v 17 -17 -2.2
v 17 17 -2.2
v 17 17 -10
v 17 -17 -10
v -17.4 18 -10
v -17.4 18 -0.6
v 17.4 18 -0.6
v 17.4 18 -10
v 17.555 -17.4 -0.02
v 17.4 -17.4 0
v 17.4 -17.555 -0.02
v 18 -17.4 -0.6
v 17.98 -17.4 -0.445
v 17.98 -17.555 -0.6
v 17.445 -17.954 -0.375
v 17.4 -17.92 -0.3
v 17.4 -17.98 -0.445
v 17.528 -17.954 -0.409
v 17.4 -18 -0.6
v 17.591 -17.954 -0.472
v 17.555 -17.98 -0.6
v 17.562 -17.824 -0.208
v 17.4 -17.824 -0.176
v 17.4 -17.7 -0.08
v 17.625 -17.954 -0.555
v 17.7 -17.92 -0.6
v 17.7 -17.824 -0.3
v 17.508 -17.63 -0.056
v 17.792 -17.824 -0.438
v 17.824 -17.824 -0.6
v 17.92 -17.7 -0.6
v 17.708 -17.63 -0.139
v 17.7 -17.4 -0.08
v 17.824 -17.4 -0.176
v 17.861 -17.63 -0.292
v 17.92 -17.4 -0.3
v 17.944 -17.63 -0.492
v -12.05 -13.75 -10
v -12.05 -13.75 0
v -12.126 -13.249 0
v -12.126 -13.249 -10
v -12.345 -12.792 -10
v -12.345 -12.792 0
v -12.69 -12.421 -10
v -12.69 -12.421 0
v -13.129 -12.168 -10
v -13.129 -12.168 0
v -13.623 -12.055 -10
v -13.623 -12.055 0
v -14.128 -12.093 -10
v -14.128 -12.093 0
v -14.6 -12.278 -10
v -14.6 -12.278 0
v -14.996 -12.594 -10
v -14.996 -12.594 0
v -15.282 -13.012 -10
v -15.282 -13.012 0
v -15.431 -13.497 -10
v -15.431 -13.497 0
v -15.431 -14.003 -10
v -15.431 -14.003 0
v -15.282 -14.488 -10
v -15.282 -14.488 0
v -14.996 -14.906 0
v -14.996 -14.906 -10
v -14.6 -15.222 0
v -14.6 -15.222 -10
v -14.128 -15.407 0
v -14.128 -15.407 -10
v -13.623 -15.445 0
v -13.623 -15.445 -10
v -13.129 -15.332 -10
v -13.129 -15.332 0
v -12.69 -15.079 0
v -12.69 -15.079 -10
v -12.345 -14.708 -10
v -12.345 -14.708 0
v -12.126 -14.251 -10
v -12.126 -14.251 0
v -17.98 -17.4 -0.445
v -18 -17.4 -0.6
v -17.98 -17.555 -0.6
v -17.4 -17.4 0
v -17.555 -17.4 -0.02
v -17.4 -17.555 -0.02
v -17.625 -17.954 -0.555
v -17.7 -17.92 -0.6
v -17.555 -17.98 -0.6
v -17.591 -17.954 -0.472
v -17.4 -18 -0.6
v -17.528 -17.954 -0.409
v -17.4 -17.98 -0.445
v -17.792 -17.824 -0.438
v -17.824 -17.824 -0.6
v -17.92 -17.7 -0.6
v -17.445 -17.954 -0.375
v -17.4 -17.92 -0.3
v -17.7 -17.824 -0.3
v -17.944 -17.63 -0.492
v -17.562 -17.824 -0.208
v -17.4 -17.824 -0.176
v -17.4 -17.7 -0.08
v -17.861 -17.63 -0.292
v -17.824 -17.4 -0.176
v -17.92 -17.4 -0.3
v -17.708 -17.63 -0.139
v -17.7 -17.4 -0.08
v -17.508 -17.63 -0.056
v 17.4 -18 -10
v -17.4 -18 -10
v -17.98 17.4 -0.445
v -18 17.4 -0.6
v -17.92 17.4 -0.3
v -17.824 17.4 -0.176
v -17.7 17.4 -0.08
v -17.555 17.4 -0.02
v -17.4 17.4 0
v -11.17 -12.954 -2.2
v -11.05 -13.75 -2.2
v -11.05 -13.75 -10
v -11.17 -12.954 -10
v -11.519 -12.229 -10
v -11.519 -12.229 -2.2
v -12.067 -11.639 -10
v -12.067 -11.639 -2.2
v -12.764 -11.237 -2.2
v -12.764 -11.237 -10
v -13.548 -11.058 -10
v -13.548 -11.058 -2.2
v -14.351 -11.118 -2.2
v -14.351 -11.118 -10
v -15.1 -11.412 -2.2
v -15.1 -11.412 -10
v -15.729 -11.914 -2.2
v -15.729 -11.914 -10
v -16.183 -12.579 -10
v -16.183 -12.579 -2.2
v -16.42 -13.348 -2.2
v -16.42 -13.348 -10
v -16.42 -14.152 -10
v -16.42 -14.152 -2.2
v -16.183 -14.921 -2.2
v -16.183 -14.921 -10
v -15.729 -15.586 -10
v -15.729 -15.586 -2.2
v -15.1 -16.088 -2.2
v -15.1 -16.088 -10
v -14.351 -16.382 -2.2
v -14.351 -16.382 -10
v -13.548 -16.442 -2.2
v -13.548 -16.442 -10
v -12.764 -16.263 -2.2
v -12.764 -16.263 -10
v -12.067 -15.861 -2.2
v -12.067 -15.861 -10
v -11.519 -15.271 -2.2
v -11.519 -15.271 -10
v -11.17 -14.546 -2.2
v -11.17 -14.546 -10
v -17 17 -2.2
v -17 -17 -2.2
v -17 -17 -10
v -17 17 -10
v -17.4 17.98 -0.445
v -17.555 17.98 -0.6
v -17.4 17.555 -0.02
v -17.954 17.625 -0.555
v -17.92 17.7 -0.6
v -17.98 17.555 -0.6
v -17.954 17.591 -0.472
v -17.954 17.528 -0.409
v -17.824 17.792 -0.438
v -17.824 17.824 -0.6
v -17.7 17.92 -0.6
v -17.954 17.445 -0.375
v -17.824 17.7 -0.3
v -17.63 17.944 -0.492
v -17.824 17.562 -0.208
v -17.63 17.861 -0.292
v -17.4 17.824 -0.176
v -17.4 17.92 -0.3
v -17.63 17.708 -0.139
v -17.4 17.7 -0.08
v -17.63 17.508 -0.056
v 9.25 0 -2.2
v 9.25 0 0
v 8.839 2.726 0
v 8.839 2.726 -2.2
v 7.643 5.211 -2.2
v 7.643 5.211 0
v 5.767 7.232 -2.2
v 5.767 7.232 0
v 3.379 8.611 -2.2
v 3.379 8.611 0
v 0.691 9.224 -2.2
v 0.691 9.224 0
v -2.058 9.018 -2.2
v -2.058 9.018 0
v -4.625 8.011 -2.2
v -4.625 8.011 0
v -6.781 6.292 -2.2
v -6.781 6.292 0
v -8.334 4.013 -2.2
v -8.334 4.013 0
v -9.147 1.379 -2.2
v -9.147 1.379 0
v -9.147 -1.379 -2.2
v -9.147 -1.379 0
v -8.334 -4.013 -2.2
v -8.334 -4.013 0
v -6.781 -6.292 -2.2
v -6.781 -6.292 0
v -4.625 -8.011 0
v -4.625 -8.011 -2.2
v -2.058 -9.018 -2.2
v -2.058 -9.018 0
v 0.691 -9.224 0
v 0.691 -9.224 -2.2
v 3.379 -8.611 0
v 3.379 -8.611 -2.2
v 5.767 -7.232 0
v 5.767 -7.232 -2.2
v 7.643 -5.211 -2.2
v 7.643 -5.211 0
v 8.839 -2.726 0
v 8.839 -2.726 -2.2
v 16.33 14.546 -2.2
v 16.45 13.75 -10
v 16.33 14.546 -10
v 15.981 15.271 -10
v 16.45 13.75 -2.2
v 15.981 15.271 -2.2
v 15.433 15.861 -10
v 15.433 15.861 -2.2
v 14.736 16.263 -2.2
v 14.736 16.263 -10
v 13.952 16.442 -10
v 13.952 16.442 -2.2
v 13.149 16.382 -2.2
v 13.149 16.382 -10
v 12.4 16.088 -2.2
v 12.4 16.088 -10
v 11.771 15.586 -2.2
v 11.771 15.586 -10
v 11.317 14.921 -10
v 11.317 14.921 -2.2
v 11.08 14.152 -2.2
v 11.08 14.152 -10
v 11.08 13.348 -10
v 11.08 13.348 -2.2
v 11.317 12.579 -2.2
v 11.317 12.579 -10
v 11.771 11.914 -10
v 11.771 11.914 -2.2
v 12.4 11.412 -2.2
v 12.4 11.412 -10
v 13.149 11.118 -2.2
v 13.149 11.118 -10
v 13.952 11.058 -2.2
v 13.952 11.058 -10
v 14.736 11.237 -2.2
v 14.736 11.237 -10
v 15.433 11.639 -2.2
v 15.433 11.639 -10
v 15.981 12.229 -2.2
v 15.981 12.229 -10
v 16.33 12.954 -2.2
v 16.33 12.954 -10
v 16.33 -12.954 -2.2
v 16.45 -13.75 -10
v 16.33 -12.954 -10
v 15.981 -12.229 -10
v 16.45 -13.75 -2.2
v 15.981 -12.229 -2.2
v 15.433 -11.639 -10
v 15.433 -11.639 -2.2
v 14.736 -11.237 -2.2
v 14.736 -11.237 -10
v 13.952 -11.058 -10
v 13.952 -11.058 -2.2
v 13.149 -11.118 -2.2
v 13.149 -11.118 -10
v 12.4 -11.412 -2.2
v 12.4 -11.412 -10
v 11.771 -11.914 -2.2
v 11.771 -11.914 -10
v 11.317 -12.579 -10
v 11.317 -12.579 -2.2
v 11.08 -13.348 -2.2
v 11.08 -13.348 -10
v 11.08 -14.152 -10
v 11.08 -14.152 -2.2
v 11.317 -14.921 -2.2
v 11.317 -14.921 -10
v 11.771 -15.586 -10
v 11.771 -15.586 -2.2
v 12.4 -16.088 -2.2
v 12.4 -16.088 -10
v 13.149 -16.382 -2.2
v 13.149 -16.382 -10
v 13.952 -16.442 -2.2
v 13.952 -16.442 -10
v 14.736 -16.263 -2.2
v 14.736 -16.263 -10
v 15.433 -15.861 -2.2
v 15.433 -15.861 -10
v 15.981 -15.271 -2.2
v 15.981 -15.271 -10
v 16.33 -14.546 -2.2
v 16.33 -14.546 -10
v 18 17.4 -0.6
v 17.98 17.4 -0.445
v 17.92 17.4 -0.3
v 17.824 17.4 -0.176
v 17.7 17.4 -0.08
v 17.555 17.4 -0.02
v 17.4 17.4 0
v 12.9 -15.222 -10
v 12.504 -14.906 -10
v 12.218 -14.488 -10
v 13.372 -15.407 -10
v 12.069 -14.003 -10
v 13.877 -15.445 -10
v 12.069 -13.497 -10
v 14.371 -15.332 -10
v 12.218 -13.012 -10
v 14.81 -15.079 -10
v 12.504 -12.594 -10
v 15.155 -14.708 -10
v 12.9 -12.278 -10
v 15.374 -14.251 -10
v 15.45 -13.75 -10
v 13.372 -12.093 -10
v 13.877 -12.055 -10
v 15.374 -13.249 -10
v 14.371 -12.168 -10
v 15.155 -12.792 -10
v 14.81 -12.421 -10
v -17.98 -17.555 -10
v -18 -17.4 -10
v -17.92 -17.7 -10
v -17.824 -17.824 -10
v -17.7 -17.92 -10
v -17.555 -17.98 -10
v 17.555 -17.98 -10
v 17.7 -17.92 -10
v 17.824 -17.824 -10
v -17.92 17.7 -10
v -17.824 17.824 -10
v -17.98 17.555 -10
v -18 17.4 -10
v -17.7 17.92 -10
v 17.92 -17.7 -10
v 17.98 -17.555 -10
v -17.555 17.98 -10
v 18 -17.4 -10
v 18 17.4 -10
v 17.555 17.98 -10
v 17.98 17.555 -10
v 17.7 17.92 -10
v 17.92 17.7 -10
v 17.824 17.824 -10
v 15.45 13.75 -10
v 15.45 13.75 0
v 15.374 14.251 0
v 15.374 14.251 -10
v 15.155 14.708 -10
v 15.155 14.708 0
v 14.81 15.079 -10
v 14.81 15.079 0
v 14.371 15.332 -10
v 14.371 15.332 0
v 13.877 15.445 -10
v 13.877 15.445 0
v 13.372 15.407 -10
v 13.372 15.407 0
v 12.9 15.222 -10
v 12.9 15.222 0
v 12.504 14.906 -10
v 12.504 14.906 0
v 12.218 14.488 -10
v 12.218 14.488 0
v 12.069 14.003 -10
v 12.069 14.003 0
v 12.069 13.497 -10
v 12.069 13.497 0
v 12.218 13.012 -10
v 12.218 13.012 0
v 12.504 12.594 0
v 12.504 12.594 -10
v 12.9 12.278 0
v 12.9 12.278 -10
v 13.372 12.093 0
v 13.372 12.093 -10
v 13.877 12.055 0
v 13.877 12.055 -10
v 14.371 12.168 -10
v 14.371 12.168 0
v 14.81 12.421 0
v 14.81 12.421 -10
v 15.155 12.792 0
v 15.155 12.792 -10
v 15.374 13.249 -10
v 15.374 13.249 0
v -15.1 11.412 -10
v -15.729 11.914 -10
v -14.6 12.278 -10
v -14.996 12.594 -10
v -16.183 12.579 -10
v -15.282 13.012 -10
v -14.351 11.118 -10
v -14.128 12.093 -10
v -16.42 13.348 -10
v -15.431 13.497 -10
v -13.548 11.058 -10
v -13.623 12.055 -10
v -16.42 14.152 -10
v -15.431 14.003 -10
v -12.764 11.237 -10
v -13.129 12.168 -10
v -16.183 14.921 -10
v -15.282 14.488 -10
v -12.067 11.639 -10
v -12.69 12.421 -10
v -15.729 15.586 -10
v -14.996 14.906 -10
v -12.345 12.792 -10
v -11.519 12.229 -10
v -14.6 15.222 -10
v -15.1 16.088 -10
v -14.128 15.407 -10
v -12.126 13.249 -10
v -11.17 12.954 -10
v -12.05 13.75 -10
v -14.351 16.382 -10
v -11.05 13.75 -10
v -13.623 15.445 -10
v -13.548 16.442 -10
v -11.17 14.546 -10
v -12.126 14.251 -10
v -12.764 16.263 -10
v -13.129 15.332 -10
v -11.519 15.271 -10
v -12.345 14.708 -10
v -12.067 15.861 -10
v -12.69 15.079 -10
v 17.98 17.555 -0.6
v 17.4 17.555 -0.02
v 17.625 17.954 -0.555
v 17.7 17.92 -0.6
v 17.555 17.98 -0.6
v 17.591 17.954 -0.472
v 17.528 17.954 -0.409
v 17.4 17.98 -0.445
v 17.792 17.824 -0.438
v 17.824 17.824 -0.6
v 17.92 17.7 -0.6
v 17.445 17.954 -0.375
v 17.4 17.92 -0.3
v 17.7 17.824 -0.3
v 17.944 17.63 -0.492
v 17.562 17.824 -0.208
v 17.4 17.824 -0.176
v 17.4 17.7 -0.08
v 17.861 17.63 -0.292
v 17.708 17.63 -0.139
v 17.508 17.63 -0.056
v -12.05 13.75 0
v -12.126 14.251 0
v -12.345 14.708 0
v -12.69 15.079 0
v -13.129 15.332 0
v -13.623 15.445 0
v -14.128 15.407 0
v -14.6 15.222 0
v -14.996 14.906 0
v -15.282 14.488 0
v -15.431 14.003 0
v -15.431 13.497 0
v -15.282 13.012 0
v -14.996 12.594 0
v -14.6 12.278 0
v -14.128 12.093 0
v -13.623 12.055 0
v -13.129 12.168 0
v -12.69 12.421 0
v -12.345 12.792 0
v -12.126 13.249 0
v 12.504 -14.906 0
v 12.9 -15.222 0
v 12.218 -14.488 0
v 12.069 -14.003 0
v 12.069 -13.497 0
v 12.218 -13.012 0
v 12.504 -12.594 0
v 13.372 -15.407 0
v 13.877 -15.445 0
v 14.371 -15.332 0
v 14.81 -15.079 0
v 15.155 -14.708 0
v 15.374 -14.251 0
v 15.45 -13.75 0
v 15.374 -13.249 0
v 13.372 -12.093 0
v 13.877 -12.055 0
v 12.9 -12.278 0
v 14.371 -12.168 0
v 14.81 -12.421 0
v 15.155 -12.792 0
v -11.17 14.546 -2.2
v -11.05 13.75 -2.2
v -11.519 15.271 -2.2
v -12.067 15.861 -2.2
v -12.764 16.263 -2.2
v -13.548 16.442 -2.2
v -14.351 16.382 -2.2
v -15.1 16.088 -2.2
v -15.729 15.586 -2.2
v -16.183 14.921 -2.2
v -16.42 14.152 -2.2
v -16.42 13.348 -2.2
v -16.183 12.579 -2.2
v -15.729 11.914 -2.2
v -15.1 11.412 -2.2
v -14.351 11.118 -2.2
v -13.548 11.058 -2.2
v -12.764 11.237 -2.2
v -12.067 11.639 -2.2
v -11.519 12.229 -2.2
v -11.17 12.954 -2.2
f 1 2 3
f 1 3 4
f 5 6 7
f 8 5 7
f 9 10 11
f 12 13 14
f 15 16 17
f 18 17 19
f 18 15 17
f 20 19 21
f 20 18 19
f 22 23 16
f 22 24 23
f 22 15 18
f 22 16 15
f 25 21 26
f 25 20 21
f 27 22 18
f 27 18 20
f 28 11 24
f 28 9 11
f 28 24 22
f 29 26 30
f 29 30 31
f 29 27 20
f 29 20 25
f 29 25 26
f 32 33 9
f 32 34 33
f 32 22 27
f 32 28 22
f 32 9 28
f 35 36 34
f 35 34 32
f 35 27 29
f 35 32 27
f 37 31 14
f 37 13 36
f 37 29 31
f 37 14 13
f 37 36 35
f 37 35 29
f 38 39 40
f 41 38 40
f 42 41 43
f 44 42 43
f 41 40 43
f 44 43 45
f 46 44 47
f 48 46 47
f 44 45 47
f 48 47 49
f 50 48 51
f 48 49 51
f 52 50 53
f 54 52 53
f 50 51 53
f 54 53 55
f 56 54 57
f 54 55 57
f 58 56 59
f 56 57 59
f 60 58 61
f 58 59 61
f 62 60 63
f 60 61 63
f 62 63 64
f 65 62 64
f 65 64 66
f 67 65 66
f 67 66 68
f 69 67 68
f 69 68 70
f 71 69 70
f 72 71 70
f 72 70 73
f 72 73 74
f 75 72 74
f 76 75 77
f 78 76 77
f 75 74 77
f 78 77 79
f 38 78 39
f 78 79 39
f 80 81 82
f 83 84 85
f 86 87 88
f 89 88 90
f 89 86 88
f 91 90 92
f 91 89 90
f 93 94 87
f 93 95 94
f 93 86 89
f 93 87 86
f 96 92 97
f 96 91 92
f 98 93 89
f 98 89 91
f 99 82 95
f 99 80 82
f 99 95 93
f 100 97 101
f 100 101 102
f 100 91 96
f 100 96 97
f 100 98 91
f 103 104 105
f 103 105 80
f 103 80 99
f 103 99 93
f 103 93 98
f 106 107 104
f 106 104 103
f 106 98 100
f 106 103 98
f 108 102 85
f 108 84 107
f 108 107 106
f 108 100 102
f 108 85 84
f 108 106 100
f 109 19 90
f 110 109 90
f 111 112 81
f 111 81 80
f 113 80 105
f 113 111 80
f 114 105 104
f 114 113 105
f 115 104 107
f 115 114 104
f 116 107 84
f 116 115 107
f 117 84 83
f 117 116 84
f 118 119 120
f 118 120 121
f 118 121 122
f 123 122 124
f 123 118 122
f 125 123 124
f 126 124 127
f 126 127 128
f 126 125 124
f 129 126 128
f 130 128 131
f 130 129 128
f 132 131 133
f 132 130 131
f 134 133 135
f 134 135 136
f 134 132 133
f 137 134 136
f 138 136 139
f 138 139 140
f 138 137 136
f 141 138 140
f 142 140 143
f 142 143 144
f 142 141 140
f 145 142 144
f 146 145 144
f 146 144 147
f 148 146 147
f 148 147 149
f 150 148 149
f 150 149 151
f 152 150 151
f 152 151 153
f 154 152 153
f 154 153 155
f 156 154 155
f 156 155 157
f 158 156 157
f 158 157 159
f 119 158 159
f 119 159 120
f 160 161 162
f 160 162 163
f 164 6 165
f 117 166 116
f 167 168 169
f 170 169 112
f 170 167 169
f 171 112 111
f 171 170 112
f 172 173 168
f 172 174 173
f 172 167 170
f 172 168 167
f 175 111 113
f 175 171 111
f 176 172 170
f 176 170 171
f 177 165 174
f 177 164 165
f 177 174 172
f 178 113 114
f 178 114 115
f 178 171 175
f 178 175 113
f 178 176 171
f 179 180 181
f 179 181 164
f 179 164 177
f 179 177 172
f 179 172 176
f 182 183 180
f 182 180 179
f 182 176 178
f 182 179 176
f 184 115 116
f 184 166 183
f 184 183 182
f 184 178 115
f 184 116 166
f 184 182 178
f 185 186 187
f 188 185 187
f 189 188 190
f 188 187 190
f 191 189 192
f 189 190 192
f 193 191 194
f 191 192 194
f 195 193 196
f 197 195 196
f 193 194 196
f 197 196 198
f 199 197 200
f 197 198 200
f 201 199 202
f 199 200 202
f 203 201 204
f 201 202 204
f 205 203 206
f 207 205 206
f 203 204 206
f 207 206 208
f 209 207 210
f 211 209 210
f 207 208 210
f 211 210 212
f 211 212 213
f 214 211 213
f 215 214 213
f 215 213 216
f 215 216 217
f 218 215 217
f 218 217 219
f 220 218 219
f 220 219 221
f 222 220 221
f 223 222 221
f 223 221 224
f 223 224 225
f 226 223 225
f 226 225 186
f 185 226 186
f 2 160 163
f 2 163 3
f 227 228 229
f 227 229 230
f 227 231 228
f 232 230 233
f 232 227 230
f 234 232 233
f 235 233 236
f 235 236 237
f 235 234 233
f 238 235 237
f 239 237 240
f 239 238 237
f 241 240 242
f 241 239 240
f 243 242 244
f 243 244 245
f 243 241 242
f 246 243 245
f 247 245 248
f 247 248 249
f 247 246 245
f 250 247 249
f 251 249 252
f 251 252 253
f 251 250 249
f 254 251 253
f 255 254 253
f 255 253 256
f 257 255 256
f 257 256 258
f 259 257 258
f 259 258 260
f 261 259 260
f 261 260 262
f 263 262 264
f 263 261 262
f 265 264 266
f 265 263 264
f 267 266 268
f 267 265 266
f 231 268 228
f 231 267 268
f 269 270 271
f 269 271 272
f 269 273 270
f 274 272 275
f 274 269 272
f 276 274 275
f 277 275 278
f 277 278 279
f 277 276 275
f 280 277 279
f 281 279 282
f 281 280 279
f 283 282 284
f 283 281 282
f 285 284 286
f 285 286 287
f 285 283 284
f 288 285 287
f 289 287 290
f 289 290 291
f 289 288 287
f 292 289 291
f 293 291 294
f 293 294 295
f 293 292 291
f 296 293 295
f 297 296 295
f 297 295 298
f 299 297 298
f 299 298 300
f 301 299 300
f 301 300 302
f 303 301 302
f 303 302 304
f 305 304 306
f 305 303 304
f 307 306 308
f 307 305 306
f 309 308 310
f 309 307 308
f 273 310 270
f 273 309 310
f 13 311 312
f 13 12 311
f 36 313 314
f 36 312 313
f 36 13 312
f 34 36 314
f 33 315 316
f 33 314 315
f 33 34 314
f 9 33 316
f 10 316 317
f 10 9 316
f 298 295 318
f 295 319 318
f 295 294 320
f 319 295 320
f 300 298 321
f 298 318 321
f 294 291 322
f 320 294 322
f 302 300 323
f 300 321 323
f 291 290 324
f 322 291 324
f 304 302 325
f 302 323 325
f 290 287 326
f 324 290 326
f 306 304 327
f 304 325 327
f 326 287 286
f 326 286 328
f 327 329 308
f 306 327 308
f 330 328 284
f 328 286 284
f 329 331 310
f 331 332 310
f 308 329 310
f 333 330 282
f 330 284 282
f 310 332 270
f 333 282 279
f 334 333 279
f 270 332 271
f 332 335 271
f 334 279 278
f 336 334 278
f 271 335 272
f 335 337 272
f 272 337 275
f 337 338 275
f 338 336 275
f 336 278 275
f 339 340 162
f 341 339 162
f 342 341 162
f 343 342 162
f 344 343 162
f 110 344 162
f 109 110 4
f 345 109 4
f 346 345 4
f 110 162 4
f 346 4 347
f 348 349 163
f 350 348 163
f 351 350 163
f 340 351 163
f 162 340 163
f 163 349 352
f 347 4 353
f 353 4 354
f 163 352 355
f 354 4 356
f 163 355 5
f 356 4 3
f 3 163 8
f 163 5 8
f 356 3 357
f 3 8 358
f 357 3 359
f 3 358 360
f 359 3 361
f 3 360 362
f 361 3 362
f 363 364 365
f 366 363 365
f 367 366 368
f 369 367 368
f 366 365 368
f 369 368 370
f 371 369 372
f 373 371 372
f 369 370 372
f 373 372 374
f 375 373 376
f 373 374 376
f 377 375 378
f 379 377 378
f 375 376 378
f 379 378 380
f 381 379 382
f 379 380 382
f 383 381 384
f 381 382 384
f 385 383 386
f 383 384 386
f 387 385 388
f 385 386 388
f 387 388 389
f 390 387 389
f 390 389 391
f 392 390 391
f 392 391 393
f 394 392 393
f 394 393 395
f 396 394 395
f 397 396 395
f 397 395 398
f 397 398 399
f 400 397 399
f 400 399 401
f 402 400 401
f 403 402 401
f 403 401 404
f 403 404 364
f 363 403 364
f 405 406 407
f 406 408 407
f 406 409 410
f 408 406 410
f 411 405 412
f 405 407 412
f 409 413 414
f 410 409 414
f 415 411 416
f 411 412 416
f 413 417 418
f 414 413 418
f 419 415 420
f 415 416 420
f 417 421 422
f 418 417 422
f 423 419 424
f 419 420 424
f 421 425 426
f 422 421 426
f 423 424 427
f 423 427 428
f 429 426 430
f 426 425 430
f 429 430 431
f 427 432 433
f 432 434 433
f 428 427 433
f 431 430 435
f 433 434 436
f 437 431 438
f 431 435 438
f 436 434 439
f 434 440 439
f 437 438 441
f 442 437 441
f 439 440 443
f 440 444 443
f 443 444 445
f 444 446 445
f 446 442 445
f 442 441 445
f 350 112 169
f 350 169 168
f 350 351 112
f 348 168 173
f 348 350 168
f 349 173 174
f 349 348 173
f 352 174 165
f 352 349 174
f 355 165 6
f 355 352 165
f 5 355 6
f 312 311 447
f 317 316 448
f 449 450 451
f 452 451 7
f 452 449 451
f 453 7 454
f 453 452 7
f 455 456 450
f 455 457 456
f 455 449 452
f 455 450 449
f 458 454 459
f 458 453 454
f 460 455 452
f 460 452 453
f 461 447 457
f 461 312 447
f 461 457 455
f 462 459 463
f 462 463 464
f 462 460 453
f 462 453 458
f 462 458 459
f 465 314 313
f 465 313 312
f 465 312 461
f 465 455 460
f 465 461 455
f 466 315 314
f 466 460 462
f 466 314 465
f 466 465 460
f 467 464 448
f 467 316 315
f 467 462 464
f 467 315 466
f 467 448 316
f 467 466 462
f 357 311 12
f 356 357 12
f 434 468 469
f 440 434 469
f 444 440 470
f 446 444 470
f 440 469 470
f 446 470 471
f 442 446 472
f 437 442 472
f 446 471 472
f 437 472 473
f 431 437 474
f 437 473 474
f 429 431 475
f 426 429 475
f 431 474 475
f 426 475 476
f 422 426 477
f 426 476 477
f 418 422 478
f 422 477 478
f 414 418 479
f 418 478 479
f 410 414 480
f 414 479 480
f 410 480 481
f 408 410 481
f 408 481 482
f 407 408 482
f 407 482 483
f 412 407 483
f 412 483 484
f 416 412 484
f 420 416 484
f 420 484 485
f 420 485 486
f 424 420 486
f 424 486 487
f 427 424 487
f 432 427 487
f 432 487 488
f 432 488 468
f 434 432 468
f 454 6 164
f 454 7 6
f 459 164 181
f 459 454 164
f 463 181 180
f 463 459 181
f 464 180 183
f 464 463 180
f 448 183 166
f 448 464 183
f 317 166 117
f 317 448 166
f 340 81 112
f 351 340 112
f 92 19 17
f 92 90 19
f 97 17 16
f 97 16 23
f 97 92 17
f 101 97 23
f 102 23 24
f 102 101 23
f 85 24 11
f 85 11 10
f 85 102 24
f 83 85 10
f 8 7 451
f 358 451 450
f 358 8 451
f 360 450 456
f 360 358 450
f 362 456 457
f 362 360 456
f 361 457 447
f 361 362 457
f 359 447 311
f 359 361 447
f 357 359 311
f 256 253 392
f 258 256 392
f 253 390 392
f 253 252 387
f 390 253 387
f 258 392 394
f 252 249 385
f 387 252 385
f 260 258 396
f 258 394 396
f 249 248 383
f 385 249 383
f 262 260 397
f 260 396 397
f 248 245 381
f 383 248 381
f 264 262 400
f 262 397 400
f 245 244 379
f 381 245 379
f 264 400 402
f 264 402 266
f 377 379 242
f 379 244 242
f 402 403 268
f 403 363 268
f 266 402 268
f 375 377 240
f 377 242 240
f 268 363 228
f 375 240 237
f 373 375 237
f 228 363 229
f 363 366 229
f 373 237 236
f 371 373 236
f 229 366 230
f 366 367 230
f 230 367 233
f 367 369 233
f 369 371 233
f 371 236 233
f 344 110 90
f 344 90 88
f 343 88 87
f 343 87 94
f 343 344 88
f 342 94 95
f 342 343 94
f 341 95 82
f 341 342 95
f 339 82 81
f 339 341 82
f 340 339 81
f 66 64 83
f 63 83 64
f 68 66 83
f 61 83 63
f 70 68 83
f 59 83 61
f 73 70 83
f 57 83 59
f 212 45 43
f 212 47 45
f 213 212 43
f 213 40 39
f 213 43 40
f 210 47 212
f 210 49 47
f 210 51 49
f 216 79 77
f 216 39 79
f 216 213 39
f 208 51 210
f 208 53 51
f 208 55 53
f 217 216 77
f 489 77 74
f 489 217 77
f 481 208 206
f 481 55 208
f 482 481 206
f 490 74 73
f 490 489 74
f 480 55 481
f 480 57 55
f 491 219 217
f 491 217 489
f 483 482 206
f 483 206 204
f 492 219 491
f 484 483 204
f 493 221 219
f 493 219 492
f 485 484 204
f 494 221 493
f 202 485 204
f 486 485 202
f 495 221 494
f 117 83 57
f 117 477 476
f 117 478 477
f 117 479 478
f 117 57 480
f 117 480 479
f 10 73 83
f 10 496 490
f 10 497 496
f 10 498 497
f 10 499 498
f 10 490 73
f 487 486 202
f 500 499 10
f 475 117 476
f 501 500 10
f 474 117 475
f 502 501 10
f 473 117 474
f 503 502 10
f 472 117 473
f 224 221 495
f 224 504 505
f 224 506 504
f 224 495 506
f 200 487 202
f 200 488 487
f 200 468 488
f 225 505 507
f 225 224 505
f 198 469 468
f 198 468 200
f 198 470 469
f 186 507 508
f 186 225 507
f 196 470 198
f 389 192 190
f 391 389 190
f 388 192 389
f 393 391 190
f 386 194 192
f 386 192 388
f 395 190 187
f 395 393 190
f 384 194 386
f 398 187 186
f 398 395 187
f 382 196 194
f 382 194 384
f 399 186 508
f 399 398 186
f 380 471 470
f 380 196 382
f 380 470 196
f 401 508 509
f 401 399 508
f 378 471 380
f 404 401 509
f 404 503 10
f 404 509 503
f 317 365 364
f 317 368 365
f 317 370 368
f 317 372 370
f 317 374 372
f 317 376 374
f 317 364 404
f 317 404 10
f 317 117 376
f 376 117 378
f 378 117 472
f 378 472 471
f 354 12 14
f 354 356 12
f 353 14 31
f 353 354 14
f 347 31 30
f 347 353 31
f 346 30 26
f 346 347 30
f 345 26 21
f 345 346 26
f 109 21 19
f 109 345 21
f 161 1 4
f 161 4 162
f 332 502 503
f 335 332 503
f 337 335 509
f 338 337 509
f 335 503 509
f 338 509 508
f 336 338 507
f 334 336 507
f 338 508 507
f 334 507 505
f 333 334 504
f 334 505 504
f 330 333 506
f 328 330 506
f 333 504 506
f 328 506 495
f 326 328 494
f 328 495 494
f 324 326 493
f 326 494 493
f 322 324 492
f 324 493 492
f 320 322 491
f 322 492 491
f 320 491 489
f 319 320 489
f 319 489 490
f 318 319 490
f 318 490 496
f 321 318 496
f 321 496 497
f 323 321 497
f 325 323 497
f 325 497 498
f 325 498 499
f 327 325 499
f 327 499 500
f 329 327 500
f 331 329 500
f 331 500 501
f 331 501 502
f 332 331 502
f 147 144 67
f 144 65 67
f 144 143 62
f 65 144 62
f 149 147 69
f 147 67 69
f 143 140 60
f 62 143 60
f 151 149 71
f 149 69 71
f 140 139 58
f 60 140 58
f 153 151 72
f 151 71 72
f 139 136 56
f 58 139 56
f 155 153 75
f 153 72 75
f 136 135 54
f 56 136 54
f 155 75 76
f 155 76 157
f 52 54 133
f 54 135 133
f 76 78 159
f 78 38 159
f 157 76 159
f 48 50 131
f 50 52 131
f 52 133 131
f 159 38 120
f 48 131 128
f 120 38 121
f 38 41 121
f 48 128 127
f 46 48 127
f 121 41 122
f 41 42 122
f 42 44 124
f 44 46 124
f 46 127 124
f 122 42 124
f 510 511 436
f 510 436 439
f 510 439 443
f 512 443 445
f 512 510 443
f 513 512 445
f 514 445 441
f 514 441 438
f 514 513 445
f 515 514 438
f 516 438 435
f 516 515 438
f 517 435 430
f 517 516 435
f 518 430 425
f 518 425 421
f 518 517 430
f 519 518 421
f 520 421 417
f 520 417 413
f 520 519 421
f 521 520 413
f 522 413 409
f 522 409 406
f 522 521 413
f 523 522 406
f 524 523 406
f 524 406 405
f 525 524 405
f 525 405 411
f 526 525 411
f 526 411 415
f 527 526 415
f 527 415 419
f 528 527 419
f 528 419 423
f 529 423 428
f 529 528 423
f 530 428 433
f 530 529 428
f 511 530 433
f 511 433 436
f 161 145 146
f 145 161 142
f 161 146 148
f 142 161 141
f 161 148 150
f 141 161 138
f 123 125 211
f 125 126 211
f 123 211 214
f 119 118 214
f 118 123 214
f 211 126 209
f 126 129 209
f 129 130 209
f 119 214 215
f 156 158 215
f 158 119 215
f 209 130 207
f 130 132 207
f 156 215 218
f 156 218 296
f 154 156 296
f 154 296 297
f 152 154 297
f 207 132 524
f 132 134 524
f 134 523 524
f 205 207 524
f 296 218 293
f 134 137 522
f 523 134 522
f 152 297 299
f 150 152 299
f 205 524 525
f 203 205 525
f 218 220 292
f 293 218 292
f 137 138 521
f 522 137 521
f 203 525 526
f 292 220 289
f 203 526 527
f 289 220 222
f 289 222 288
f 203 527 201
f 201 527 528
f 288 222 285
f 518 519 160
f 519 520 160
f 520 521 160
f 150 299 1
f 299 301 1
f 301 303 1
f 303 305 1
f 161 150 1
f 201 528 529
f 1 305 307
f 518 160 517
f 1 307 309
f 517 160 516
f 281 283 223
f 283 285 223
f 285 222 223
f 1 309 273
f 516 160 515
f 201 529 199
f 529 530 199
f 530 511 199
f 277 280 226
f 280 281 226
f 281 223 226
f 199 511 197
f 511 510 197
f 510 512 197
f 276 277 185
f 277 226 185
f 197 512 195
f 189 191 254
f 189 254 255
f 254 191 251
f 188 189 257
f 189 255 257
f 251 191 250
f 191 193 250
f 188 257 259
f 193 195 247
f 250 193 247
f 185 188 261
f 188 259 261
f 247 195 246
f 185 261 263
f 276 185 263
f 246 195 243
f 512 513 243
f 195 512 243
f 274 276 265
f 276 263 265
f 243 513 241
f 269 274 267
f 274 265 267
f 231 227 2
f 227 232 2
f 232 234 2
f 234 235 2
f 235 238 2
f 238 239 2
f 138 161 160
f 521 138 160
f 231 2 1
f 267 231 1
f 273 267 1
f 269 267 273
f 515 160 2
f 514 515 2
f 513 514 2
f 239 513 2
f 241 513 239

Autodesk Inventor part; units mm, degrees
ref_plane "YZ Plane" through (0, 0, 0) normal (1, 0, 0) x (0, 1, 0)
ref_plane "XZ Plane" through (0, 0, 0) normal (0, 1, 0) x (-1, 0, 0)
ref_plane "XY Plane" through (0, 0, 0) normal (0, 0, 1) x (1, 0, 0)
sketch "Sketch1" plane through (0, 0, 0) normal (0, 0, 1) x (1, 0, 0)
  circle A0 centre (0, 0) radius 25.4 construction
  line L0 (-13.75, -13.75) -> (13.75, -13.75) construction
  line L1 (13.75, -13.75) -> (13.75, 13.75) construction
  line L2 (13.75, 13.75) -> (-13.75, 13.75) construction
  line L3 (-13.75, 13.75) -> (-13.75, -13.75) construction
  line L4 (-13.75, -13.75) -> (13.75, 13.75) construction
  line L5 (13.75, -13.75) -> (-13.75, 13.75) construction
  circle A1 centre (0, 0) radius 9.25
  circle A2 centre (-13.75, 13.75) radius 1.7
  circle A3 centre (-13.75, 13.75) radius 2.7
  circle A4 centre (-25.4, 0) radius 1.7
  circle A5 centre (-25.4, 0) radius 3.8
  line L6 (-17, 17) -> (17, 17)
  line L7 (17, 17) -> (17, -17)
  line L8 (17, -17) -> (-17, -17)
  line L9 (-17, -17) -> (-17, 17)
  line L10 (-17, 17) -> (17, -17) construction
  line L11 (17, 17) -> (-17, -17) construction
  line L12 (-25.4, 3.8) -> (-18, 3.8)
  line L13 (-25.4, -3.8) -> (-18, -3.8)
  line L14 (0, 17) -> (0, -17) construction
  line L15 (-17, 0) -> (17, 0) construction
  circle A6 centre (25.4, 0) radius 1.7
  circle A7 centre (25.4, 0) radius 3.8
  line L16 (25.4, 3.8) -> (18, 3.8)
  line L17 (25.4, -3.8) -> (18, -3.8)
  circle A8 centre (13.75, 13.75) radius 1.7
  circle A9 centre (13.75, 13.75) radius 2.7
  circle A10 centre (-13.75, -13.75) radius 1.7
  circle A11 centre (-13.75, -13.75) radius 2.7
  circle A12 centre (13.75, -13.75) radius 2.7
  circle A13 centre (13.75, -13.75) radius 1.7
  line L18 (-18, 18) -> (18, 18)
  line L19 (18, 18) -> (18, -18)
  line L20 (18, -18) -> (-18, -18)
  line L21 (-18, -18) -> (-18, 18)
  line L22 (-18, 18) -> (18, -18) construction
  line L23 (18, 18) -> (-18, -18) construction
  point P0 (-17, 3.8)
  point P1 (-17, -3.8)
  point P2 (17, 3.8)
  point P3 (17, -3.8)
  dimension "d0" = 50.8
  dimension "d1" = 27.5
  dimension "d2" = 27.5
  dimension "d3" = 18.5
  dimension "d4" = 3.4
  dimension "d5" = 5.4
  dimension "d6" = 3.4
  dimension "d7" = 7.6
  dimension "d8" = 34
  dimension "d9" = 34
  dimension "d10" = 36
  dimension "d11" = 36
extrude "Extrusion1" add sketch "Sketch1" against normal blind 10 contours A3 | L21 L18 L19 L20 | A9 | A11 | A12
extrude "Extrusion2" add sketch "Sketch1" against normal blind 2.2 contours L6 L7 L8 L9
fillet "Fillet1" radius 0.6 8 edges at (18, 0, 0) (0, 18, 0) (-18, 0, 0) (0, -18, 0) (18, 18, -5) (-18, 18, -5) (-18, -18, -5) (18, -18, -5)
equation "\"d9\" = d8"
properties part number "cameraTop"
